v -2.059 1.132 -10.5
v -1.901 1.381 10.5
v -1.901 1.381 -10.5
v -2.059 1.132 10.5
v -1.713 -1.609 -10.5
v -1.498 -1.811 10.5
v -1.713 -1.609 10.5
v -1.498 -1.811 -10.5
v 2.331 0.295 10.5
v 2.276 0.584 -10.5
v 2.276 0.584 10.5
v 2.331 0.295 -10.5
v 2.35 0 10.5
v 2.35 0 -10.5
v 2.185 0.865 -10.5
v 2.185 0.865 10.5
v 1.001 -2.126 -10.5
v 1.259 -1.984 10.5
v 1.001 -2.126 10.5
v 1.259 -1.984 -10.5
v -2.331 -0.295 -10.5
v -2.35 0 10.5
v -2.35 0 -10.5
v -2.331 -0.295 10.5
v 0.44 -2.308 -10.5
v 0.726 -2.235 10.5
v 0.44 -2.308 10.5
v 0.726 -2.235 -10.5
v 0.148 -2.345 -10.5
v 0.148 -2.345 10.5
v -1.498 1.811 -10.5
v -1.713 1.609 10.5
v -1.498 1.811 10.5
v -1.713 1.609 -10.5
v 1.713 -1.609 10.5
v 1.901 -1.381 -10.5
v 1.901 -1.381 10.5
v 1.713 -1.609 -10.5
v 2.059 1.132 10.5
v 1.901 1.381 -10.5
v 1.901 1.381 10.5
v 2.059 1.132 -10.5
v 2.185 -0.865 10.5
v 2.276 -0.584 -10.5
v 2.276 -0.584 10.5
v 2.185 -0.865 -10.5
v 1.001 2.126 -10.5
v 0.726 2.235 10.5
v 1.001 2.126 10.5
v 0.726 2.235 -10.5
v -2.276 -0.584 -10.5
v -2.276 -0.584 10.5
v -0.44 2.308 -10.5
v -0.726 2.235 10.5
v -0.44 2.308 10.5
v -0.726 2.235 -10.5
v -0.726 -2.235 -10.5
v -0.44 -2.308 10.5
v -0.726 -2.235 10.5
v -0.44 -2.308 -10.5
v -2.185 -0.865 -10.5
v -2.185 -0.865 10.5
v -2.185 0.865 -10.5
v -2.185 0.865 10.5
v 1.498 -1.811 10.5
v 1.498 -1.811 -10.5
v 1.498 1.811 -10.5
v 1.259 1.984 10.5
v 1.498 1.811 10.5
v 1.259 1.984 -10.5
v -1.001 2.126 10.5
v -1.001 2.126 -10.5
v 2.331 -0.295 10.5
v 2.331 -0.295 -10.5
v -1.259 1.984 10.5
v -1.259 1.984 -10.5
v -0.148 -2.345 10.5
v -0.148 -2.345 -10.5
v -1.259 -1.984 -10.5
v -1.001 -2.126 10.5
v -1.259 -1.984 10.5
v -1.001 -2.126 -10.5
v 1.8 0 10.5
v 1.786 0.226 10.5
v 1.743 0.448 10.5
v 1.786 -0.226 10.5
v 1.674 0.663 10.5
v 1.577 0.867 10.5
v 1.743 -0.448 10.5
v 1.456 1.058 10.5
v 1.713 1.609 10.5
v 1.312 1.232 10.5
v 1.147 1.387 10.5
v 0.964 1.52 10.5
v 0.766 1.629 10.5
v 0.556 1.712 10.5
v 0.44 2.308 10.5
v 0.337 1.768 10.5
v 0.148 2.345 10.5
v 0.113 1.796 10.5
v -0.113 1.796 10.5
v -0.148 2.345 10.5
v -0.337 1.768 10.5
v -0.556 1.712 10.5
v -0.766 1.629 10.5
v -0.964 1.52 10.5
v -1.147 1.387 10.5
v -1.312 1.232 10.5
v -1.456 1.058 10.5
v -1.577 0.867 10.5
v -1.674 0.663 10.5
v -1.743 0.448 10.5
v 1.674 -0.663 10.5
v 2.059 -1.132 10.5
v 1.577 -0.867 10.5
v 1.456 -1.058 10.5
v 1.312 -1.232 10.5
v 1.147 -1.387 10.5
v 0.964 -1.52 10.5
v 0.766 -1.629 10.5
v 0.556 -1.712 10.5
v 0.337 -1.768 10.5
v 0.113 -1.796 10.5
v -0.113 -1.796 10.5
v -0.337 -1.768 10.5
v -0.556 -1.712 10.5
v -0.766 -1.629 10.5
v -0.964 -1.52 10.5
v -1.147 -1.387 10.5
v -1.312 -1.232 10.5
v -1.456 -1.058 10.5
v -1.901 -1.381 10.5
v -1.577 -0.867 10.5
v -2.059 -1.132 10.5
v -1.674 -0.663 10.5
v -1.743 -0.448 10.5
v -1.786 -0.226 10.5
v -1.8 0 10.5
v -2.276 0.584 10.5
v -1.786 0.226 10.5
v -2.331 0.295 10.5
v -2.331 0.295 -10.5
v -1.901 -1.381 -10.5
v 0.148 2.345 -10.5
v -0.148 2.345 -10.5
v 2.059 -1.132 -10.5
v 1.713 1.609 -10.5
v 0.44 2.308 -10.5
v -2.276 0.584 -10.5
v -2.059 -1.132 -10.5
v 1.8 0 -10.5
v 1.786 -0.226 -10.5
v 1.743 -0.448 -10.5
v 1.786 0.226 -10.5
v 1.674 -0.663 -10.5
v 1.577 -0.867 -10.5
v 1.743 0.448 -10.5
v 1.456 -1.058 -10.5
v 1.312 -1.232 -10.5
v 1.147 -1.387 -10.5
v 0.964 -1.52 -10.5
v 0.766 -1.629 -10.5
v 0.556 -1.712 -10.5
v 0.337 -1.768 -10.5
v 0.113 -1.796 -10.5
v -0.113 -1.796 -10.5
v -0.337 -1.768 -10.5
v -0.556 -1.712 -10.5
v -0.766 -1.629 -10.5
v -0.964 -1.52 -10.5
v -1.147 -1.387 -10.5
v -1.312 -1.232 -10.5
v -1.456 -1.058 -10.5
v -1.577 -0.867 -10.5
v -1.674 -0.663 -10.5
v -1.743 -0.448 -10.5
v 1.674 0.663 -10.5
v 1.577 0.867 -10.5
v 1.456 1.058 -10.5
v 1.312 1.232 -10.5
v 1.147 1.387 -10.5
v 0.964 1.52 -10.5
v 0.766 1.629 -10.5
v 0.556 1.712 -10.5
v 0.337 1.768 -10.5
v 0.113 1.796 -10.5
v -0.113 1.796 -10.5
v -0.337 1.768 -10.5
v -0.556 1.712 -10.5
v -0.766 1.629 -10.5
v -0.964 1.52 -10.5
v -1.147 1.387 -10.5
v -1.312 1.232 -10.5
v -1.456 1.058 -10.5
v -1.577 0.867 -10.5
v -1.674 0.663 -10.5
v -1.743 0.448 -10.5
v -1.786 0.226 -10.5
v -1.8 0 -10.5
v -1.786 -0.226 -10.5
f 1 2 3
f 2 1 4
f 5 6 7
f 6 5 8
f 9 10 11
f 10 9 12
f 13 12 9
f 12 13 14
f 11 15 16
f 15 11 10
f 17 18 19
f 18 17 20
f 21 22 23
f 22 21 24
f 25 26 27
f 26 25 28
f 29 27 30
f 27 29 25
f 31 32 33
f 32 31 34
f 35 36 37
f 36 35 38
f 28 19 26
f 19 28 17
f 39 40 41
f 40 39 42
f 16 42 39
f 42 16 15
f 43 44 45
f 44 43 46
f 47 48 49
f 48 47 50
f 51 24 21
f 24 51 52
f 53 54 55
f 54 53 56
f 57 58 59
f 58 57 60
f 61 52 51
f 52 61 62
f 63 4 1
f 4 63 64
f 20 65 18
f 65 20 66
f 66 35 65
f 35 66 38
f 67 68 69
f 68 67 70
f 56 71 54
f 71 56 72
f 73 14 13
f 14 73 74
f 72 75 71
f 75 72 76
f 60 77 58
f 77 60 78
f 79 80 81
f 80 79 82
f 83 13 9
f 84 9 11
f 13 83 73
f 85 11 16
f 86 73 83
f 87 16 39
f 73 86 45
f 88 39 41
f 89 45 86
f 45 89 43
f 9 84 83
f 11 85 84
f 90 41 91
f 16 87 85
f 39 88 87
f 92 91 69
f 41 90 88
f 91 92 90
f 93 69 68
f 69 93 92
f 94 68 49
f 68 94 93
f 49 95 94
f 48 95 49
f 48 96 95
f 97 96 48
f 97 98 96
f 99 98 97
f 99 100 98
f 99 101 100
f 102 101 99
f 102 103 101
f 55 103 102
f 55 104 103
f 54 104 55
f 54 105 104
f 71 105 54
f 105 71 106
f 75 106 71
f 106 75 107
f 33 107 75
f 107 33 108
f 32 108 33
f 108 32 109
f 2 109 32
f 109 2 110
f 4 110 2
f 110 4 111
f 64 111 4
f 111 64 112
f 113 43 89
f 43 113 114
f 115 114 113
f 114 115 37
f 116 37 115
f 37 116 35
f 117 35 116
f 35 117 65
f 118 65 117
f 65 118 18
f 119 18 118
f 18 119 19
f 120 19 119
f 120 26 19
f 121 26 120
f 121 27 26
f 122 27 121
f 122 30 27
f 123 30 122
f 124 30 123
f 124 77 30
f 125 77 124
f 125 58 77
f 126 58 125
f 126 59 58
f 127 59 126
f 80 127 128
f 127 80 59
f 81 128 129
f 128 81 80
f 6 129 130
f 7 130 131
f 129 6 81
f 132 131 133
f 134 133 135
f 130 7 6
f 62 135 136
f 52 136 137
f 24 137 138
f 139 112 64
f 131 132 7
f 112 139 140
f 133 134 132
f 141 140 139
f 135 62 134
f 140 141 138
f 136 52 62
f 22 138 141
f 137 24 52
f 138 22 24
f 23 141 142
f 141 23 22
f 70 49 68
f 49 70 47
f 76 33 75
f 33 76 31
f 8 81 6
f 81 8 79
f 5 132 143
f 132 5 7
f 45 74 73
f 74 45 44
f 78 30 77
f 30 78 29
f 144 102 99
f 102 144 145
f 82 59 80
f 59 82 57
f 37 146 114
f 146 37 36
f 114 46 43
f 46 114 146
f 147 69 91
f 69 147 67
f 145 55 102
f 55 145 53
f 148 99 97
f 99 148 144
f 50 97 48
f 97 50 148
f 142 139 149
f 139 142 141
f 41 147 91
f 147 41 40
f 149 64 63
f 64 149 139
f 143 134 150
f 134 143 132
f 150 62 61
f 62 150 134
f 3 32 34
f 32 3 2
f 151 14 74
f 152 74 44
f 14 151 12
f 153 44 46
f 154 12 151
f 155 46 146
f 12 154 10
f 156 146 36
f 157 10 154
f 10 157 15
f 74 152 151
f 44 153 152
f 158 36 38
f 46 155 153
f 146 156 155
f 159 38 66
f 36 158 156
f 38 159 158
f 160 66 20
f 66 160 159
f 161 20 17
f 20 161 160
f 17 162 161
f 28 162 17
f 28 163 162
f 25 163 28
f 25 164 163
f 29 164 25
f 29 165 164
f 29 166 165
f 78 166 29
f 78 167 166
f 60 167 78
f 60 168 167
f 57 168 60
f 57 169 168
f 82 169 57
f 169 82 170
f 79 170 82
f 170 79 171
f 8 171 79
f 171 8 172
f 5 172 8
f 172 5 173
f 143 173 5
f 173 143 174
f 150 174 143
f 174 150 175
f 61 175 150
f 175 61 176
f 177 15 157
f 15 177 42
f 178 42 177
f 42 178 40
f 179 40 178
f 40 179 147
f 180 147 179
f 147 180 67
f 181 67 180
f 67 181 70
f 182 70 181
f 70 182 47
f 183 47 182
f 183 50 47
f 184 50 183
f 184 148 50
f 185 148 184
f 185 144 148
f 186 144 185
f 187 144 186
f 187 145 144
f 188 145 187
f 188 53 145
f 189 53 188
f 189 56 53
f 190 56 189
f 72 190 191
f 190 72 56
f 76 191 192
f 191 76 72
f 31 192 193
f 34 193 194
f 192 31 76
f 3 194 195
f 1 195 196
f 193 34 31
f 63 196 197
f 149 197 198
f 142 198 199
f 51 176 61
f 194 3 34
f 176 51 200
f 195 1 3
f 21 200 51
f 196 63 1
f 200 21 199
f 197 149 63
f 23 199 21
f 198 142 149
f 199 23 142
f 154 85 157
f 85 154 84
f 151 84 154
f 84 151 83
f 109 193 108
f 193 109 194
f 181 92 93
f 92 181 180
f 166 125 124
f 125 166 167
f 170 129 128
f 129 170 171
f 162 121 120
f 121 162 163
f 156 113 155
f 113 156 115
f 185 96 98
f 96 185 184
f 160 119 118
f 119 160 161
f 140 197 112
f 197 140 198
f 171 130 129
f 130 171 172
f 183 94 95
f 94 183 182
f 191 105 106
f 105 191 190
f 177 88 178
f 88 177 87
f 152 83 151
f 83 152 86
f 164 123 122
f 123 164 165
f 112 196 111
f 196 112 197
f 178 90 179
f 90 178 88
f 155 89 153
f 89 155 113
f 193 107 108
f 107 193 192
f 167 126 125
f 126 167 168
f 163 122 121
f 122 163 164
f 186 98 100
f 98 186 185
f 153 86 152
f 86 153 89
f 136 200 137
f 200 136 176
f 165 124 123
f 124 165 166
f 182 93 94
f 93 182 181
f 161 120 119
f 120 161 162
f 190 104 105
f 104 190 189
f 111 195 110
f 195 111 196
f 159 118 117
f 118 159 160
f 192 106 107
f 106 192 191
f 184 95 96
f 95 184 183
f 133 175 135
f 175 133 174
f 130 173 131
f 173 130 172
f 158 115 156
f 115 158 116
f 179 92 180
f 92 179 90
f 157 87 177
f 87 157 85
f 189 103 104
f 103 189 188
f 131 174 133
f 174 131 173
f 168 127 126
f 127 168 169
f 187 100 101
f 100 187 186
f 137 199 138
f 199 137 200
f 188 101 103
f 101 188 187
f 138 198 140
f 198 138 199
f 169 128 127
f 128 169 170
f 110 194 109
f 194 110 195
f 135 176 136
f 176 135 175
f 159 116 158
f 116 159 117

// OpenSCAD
$fn = 50;


difference() {
	union() {
		translate(v = [0, 0, -10.5000000000]) {
			cylinder(h = 21, r = 2.3500000000);
		}
	}
	union() {
		#translate(v = [0, 0, -100.0000000000]) {
			cylinder(h = 200, r = 1.8000000000);
		}
	}
}
